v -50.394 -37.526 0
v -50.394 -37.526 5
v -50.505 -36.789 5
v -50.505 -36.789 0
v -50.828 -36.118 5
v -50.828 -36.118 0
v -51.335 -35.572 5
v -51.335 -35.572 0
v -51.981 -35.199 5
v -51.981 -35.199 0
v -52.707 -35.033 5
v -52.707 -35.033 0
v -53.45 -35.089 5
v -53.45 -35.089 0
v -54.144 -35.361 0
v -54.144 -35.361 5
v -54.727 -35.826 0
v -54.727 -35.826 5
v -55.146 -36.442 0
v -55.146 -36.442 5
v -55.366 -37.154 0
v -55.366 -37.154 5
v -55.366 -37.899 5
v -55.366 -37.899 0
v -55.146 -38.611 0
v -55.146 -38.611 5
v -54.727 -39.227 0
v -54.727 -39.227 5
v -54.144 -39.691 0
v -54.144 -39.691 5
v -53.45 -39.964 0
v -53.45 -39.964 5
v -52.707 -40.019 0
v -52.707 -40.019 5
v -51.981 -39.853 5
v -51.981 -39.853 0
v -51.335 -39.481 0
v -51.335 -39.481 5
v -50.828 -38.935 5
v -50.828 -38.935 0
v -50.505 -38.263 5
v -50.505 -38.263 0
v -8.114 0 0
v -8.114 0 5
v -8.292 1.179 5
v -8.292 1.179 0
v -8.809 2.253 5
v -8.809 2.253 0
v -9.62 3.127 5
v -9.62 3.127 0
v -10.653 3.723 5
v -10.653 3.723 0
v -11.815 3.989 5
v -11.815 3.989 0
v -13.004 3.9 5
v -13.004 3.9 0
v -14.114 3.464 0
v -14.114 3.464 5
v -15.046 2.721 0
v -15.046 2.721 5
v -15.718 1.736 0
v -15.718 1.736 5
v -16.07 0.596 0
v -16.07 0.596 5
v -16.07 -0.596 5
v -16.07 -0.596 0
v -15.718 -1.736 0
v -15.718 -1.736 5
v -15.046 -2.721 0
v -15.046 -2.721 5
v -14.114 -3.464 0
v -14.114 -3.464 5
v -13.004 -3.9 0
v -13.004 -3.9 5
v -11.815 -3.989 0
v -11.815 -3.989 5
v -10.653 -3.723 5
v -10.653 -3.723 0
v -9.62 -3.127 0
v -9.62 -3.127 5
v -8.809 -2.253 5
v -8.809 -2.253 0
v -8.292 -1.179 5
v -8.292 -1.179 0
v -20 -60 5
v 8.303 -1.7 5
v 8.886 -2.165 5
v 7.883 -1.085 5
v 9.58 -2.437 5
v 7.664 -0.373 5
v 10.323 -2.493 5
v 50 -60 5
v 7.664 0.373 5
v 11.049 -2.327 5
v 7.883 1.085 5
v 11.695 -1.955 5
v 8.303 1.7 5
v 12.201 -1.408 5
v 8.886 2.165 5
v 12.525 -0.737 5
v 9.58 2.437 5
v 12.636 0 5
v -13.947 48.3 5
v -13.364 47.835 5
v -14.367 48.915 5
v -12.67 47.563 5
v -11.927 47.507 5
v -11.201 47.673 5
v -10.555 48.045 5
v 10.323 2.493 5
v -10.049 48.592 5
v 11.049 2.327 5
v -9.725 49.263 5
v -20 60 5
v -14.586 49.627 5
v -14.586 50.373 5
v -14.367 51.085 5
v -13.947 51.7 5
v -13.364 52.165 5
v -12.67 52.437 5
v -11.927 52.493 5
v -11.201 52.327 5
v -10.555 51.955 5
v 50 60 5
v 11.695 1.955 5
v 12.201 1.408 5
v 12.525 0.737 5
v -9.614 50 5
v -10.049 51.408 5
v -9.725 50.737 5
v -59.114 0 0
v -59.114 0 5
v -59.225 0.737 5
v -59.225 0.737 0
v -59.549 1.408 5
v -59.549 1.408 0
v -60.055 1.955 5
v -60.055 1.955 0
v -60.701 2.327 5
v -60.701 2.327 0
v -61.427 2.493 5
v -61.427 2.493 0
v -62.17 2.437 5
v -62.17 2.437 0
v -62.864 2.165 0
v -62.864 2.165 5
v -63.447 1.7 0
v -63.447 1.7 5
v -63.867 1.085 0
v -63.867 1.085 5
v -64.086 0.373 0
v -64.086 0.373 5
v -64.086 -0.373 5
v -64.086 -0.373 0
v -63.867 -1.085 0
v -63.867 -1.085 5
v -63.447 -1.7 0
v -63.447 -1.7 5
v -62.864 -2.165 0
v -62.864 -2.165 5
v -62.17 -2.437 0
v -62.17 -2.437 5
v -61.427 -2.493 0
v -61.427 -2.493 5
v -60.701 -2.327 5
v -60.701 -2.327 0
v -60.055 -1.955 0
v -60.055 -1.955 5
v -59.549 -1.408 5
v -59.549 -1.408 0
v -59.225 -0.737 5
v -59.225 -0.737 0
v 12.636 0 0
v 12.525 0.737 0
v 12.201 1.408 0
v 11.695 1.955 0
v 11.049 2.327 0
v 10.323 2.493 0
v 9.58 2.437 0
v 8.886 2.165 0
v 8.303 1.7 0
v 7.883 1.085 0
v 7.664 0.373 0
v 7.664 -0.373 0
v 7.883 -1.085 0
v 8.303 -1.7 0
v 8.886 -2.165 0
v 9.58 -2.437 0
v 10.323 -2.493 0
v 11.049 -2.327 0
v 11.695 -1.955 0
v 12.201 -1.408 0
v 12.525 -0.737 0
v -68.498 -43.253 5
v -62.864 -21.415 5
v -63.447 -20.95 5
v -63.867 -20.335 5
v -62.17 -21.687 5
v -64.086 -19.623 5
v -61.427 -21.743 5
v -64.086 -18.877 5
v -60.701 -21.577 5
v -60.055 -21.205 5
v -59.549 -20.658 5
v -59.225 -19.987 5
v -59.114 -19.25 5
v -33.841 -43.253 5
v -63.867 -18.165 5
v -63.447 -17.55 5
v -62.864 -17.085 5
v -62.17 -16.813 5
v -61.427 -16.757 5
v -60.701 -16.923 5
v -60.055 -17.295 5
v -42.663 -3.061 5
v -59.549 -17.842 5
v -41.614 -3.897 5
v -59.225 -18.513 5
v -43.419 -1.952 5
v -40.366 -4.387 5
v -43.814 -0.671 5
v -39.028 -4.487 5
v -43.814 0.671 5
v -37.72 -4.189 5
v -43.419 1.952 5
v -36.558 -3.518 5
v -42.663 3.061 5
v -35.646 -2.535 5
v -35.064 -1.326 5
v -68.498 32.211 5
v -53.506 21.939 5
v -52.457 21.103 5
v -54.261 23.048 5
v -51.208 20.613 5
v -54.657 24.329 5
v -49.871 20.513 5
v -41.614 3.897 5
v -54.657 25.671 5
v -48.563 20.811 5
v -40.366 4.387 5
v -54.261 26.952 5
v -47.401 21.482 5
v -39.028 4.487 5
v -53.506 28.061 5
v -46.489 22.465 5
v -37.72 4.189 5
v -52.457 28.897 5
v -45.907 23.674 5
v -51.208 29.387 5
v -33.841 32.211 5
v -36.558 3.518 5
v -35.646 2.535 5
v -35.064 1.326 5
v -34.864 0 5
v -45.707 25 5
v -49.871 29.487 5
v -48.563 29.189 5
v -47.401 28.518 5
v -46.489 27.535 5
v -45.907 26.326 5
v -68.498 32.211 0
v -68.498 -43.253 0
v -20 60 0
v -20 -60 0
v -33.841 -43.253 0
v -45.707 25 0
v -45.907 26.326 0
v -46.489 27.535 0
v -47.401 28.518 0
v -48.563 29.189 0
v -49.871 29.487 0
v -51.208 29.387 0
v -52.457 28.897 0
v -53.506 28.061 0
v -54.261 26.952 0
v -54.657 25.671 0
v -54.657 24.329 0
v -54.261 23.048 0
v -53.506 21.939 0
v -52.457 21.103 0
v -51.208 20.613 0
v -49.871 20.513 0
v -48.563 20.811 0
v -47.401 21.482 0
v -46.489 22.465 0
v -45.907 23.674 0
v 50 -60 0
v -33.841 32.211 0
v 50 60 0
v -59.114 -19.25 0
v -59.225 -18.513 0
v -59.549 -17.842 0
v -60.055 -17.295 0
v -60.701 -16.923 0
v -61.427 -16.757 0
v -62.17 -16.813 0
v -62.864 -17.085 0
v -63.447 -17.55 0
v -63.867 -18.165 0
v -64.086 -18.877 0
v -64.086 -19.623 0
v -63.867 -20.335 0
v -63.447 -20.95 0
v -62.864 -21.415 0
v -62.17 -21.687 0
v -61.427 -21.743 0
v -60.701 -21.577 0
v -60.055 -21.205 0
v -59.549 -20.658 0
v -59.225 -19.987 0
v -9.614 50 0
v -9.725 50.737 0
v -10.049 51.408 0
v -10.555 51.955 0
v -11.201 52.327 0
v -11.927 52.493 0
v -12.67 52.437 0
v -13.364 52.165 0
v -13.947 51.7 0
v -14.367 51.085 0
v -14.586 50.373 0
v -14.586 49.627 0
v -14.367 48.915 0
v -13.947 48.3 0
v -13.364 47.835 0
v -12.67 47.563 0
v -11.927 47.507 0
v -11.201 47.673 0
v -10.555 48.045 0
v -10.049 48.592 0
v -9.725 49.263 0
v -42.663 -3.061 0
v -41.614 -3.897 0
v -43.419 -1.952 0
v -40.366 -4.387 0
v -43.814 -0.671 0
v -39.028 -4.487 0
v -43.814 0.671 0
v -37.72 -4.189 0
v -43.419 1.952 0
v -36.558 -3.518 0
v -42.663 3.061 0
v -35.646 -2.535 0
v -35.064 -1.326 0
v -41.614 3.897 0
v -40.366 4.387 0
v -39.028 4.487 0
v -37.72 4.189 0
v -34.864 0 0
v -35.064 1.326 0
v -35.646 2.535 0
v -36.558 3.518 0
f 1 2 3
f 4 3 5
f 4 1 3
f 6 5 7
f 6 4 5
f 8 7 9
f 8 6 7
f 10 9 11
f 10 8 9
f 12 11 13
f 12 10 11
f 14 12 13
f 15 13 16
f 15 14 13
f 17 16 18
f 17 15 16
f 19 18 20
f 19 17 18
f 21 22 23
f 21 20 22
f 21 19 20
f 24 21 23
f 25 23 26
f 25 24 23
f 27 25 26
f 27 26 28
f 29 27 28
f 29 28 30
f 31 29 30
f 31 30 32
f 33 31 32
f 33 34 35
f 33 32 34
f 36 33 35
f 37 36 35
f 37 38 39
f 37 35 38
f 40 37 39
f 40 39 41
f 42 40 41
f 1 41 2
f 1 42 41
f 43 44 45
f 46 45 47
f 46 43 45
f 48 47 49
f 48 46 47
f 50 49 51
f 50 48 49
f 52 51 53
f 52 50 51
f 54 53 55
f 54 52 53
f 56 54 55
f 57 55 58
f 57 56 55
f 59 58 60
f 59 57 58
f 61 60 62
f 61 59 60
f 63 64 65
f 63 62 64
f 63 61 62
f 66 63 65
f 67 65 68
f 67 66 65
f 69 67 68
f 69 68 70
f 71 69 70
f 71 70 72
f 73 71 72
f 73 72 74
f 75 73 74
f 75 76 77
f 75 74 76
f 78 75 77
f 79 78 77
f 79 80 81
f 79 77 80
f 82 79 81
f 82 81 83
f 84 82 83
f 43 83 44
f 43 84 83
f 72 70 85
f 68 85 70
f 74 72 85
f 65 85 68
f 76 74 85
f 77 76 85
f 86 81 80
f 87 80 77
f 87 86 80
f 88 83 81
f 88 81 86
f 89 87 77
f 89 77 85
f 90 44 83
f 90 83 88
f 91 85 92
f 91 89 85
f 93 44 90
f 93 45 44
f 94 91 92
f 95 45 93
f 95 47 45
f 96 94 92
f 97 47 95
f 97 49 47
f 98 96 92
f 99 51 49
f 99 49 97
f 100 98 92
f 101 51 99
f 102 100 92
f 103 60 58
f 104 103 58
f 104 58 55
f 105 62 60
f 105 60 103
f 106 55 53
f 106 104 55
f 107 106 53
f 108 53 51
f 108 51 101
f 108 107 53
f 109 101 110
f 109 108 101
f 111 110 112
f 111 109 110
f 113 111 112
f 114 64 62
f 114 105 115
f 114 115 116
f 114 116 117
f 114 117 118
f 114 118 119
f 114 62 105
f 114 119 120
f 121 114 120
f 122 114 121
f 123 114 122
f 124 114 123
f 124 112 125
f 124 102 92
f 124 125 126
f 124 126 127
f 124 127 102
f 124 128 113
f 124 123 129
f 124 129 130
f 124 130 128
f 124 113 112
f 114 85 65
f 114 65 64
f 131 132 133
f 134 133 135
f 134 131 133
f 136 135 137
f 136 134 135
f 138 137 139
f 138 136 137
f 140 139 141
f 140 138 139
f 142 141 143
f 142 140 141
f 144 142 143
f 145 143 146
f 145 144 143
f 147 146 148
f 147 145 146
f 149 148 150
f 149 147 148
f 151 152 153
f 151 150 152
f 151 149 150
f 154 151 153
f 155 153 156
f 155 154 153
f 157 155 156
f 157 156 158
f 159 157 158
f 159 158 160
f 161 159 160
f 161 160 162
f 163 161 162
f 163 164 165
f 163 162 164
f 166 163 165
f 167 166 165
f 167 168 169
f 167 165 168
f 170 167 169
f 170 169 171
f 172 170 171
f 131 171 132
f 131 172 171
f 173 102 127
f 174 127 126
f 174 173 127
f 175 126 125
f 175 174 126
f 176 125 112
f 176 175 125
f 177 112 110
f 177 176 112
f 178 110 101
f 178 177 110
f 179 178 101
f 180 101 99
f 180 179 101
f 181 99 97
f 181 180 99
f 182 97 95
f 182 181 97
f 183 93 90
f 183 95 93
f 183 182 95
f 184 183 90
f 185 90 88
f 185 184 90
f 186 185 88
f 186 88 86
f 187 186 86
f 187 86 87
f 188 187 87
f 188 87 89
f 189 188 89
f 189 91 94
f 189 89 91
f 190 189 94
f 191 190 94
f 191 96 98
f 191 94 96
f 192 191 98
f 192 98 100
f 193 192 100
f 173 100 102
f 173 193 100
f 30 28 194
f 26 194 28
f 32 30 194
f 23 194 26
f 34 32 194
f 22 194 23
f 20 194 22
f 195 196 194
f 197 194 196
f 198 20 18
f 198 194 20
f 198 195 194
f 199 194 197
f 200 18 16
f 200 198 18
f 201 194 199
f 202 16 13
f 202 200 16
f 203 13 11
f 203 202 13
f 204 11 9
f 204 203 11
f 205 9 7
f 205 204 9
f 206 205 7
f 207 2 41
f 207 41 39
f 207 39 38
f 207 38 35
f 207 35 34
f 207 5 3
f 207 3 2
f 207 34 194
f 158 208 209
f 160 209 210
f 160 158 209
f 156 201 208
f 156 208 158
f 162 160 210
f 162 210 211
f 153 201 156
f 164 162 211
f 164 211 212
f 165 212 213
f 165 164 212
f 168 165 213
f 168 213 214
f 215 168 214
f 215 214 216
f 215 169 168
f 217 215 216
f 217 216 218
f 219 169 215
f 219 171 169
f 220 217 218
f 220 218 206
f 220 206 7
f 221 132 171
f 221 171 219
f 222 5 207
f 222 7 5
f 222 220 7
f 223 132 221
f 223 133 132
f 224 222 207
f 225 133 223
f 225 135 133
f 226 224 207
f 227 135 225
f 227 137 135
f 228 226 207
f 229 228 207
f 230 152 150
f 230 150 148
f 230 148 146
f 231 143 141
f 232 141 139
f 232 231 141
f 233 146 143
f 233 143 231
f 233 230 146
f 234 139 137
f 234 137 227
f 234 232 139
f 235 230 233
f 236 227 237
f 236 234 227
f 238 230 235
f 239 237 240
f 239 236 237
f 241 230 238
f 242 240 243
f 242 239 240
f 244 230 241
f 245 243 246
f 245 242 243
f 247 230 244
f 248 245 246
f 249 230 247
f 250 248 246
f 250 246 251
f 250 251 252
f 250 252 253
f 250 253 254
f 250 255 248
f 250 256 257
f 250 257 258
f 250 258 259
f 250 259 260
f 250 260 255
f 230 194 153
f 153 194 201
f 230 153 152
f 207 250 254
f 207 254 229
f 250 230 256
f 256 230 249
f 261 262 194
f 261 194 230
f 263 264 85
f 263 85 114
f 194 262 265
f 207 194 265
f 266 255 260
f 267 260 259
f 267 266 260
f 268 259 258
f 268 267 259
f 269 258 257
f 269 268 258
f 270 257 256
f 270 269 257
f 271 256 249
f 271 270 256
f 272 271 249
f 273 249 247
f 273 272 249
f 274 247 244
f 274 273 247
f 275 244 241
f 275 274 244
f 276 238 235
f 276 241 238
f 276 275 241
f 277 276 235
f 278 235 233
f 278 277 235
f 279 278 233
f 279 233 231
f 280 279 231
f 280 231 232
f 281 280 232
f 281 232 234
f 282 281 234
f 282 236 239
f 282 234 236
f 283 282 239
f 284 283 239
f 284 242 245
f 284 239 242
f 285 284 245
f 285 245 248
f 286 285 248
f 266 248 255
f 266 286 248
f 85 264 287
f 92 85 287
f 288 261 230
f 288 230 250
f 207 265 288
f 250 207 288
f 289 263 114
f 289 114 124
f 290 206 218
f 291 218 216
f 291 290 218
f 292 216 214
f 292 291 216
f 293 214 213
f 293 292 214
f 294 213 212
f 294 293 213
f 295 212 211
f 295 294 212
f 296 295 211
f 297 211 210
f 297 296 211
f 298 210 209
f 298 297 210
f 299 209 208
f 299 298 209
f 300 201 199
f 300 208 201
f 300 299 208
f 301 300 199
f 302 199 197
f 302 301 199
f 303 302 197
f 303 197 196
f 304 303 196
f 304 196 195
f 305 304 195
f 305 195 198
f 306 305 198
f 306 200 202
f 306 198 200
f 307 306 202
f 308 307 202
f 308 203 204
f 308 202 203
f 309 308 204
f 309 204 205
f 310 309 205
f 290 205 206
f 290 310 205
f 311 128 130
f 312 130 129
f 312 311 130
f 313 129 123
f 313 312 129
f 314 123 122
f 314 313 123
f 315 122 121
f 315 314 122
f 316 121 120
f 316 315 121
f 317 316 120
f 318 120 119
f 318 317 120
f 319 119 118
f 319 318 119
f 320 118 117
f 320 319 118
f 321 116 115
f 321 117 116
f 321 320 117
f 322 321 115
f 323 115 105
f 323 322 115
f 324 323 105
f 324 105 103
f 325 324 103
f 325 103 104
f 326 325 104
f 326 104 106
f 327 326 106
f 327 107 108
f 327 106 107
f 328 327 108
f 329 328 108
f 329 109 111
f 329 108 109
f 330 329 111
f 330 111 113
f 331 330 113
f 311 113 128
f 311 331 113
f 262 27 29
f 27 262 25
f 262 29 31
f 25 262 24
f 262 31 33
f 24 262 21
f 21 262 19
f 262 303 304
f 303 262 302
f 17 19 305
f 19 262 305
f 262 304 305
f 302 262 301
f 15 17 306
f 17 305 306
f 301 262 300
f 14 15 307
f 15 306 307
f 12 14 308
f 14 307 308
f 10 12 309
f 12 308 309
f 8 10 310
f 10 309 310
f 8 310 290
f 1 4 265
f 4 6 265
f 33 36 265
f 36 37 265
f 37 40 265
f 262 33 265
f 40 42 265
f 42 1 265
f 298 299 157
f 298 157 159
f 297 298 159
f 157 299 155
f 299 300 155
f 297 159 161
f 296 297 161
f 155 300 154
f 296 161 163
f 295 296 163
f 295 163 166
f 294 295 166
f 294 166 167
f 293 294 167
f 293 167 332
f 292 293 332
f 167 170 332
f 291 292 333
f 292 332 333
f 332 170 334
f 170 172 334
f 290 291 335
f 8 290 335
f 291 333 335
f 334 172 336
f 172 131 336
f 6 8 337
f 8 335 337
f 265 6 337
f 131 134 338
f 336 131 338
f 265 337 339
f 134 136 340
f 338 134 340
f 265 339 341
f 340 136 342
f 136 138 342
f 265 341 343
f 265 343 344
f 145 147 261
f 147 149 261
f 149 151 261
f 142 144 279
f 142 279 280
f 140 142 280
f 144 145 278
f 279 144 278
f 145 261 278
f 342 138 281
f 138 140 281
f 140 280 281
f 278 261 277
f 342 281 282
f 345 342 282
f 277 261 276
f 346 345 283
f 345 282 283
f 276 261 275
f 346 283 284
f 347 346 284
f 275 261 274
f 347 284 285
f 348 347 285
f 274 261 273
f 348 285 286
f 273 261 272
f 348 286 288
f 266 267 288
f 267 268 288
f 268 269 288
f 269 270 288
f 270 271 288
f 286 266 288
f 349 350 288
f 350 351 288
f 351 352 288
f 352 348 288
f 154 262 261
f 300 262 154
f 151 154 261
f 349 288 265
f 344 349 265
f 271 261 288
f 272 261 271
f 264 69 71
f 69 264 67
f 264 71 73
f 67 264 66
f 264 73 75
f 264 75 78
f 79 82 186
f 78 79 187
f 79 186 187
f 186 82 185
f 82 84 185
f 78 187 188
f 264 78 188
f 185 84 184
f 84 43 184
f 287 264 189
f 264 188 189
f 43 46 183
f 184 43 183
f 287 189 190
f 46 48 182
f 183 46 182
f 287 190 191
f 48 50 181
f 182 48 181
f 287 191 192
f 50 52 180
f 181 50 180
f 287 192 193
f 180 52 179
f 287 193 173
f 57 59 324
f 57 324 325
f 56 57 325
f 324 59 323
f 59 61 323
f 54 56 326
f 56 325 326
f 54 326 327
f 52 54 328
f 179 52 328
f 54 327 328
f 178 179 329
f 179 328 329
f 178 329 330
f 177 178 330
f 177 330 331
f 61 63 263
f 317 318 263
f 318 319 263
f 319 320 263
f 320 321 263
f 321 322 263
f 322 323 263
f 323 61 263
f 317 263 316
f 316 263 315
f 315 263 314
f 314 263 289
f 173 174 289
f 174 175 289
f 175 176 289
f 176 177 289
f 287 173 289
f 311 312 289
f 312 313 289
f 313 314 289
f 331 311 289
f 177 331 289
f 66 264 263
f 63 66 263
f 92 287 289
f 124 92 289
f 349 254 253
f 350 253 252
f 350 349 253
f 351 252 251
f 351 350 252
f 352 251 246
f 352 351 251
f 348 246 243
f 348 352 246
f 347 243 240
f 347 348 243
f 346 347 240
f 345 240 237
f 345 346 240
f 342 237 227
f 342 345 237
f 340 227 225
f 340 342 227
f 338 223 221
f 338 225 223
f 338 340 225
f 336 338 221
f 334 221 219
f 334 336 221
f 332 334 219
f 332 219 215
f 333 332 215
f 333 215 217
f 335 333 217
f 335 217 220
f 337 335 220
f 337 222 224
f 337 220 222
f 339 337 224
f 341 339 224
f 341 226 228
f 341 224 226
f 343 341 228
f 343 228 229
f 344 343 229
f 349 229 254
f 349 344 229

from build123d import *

# Parameters (mm, degrees)
F3_W      = 34.657259
F3_H      = 75.46364
F9_DEPTH  = 5
F6_R      = 2.5
F10_DEPTH = 25
F7_R      = 2.5
F11_DEPTH = 25
F4_R      = 4.5
F12_DEPTH = 25
F0_W      = 70
F0_H      = 120
F13_DEPTH = 5
F1_R      = 4
F14_DEPTH = 25
F5_R      = 2.5
F15_DEPTH = 25
F2_R      = 2.5
F16_DEPTH = 25
F17_DEPTH = 25
F8_R      = 4.5
F18_DEPTH = 25
F19_R     = 2.5
F20_DEPTH = 25


with BuildPart() as f9:
    # F3 (on Top) → F9 (new body)
    with BuildSketch(Plane.XY):
        with Locations((-51.169356, -5.521067)):
            Rectangle(F3_W, F3_H)
    extrude(amount=F9_DEPTH)

    # F6 (on face) → F10 (cut)
    with BuildSketch(Plane.XY):
        with Locations((-61.614193, 0)):
            Circle(F6_R)
    extrude(amount=F10_DEPTH, mode=Mode.SUBTRACT)

    # F7 (on Top) → F11 (cut)
    with BuildSketch(Plane.XY):
        with Locations((-61.61419, -19.25)):
            Circle(F7_R)
    extrude(amount=-F11_DEPTH, mode=Mode.SUBTRACT)

    # F4 (on face) → F12 (cut)
    with BuildSketch(Plane.XY):
        with Locations((-39.364193, 0)):
            Circle(F4_R)
    extrude(amount=F12_DEPTH, mode=Mode.SUBTRACT)

    # F7 (on Top) → F17 (cut)
    with BuildSketch(Plane.XY):
        with Locations((-61.61419, -19.25)):
            Circle(F7_R)
    extrude(amount=F17_DEPTH, mode=Mode.SUBTRACT)

    # F8 (on Top) → F18 (cut)
    with BuildSketch(Plane.XY):
        with Locations((-50.206818, 25)):
            Circle(F8_R)
    extrude(amount=F18_DEPTH, mode=Mode.SUBTRACT)

    # F19 (on Top) → F20 (cut)
    with BuildSketch(Plane.XY):
        with Locations((-52.89399, -37.526231)):
            Circle(F19_R)
    extrude(amount=F20_DEPTH, mode=Mode.SUBTRACT)


with BuildPart() as f13:
    # F0 (on Top) → F13 (new body)
    with BuildSketch(Plane.XY):
        with Locations((15, 0)):
            Rectangle(F0_W, F0_H)
    extrude(amount=F13_DEPTH)

    # F1 (on face) → F14 (cut)
    with BuildSketch(Plane.XY):
        with Locations((-12.114193, 0)):
            Circle(F1_R)
    extrude(amount=F14_DEPTH, mode=Mode.SUBTRACT)

    # F5 (on face) → F15 (cut)
    with BuildSketch(Plane.XY):
        with Locations((-12.11419, 50)):
            Circle(F5_R)
    extrude(amount=F15_DEPTH, mode=Mode.SUBTRACT)

    # F2 (on face) → F16 (cut)
    with BuildSketch(Plane.XY):
        with Locations((10.135807, 0)):
            Circle(F2_R)
    extrude(amount=F16_DEPTH, mode=Mode.SUBTRACT)


solid = Compound([f9.part, f13.part])
